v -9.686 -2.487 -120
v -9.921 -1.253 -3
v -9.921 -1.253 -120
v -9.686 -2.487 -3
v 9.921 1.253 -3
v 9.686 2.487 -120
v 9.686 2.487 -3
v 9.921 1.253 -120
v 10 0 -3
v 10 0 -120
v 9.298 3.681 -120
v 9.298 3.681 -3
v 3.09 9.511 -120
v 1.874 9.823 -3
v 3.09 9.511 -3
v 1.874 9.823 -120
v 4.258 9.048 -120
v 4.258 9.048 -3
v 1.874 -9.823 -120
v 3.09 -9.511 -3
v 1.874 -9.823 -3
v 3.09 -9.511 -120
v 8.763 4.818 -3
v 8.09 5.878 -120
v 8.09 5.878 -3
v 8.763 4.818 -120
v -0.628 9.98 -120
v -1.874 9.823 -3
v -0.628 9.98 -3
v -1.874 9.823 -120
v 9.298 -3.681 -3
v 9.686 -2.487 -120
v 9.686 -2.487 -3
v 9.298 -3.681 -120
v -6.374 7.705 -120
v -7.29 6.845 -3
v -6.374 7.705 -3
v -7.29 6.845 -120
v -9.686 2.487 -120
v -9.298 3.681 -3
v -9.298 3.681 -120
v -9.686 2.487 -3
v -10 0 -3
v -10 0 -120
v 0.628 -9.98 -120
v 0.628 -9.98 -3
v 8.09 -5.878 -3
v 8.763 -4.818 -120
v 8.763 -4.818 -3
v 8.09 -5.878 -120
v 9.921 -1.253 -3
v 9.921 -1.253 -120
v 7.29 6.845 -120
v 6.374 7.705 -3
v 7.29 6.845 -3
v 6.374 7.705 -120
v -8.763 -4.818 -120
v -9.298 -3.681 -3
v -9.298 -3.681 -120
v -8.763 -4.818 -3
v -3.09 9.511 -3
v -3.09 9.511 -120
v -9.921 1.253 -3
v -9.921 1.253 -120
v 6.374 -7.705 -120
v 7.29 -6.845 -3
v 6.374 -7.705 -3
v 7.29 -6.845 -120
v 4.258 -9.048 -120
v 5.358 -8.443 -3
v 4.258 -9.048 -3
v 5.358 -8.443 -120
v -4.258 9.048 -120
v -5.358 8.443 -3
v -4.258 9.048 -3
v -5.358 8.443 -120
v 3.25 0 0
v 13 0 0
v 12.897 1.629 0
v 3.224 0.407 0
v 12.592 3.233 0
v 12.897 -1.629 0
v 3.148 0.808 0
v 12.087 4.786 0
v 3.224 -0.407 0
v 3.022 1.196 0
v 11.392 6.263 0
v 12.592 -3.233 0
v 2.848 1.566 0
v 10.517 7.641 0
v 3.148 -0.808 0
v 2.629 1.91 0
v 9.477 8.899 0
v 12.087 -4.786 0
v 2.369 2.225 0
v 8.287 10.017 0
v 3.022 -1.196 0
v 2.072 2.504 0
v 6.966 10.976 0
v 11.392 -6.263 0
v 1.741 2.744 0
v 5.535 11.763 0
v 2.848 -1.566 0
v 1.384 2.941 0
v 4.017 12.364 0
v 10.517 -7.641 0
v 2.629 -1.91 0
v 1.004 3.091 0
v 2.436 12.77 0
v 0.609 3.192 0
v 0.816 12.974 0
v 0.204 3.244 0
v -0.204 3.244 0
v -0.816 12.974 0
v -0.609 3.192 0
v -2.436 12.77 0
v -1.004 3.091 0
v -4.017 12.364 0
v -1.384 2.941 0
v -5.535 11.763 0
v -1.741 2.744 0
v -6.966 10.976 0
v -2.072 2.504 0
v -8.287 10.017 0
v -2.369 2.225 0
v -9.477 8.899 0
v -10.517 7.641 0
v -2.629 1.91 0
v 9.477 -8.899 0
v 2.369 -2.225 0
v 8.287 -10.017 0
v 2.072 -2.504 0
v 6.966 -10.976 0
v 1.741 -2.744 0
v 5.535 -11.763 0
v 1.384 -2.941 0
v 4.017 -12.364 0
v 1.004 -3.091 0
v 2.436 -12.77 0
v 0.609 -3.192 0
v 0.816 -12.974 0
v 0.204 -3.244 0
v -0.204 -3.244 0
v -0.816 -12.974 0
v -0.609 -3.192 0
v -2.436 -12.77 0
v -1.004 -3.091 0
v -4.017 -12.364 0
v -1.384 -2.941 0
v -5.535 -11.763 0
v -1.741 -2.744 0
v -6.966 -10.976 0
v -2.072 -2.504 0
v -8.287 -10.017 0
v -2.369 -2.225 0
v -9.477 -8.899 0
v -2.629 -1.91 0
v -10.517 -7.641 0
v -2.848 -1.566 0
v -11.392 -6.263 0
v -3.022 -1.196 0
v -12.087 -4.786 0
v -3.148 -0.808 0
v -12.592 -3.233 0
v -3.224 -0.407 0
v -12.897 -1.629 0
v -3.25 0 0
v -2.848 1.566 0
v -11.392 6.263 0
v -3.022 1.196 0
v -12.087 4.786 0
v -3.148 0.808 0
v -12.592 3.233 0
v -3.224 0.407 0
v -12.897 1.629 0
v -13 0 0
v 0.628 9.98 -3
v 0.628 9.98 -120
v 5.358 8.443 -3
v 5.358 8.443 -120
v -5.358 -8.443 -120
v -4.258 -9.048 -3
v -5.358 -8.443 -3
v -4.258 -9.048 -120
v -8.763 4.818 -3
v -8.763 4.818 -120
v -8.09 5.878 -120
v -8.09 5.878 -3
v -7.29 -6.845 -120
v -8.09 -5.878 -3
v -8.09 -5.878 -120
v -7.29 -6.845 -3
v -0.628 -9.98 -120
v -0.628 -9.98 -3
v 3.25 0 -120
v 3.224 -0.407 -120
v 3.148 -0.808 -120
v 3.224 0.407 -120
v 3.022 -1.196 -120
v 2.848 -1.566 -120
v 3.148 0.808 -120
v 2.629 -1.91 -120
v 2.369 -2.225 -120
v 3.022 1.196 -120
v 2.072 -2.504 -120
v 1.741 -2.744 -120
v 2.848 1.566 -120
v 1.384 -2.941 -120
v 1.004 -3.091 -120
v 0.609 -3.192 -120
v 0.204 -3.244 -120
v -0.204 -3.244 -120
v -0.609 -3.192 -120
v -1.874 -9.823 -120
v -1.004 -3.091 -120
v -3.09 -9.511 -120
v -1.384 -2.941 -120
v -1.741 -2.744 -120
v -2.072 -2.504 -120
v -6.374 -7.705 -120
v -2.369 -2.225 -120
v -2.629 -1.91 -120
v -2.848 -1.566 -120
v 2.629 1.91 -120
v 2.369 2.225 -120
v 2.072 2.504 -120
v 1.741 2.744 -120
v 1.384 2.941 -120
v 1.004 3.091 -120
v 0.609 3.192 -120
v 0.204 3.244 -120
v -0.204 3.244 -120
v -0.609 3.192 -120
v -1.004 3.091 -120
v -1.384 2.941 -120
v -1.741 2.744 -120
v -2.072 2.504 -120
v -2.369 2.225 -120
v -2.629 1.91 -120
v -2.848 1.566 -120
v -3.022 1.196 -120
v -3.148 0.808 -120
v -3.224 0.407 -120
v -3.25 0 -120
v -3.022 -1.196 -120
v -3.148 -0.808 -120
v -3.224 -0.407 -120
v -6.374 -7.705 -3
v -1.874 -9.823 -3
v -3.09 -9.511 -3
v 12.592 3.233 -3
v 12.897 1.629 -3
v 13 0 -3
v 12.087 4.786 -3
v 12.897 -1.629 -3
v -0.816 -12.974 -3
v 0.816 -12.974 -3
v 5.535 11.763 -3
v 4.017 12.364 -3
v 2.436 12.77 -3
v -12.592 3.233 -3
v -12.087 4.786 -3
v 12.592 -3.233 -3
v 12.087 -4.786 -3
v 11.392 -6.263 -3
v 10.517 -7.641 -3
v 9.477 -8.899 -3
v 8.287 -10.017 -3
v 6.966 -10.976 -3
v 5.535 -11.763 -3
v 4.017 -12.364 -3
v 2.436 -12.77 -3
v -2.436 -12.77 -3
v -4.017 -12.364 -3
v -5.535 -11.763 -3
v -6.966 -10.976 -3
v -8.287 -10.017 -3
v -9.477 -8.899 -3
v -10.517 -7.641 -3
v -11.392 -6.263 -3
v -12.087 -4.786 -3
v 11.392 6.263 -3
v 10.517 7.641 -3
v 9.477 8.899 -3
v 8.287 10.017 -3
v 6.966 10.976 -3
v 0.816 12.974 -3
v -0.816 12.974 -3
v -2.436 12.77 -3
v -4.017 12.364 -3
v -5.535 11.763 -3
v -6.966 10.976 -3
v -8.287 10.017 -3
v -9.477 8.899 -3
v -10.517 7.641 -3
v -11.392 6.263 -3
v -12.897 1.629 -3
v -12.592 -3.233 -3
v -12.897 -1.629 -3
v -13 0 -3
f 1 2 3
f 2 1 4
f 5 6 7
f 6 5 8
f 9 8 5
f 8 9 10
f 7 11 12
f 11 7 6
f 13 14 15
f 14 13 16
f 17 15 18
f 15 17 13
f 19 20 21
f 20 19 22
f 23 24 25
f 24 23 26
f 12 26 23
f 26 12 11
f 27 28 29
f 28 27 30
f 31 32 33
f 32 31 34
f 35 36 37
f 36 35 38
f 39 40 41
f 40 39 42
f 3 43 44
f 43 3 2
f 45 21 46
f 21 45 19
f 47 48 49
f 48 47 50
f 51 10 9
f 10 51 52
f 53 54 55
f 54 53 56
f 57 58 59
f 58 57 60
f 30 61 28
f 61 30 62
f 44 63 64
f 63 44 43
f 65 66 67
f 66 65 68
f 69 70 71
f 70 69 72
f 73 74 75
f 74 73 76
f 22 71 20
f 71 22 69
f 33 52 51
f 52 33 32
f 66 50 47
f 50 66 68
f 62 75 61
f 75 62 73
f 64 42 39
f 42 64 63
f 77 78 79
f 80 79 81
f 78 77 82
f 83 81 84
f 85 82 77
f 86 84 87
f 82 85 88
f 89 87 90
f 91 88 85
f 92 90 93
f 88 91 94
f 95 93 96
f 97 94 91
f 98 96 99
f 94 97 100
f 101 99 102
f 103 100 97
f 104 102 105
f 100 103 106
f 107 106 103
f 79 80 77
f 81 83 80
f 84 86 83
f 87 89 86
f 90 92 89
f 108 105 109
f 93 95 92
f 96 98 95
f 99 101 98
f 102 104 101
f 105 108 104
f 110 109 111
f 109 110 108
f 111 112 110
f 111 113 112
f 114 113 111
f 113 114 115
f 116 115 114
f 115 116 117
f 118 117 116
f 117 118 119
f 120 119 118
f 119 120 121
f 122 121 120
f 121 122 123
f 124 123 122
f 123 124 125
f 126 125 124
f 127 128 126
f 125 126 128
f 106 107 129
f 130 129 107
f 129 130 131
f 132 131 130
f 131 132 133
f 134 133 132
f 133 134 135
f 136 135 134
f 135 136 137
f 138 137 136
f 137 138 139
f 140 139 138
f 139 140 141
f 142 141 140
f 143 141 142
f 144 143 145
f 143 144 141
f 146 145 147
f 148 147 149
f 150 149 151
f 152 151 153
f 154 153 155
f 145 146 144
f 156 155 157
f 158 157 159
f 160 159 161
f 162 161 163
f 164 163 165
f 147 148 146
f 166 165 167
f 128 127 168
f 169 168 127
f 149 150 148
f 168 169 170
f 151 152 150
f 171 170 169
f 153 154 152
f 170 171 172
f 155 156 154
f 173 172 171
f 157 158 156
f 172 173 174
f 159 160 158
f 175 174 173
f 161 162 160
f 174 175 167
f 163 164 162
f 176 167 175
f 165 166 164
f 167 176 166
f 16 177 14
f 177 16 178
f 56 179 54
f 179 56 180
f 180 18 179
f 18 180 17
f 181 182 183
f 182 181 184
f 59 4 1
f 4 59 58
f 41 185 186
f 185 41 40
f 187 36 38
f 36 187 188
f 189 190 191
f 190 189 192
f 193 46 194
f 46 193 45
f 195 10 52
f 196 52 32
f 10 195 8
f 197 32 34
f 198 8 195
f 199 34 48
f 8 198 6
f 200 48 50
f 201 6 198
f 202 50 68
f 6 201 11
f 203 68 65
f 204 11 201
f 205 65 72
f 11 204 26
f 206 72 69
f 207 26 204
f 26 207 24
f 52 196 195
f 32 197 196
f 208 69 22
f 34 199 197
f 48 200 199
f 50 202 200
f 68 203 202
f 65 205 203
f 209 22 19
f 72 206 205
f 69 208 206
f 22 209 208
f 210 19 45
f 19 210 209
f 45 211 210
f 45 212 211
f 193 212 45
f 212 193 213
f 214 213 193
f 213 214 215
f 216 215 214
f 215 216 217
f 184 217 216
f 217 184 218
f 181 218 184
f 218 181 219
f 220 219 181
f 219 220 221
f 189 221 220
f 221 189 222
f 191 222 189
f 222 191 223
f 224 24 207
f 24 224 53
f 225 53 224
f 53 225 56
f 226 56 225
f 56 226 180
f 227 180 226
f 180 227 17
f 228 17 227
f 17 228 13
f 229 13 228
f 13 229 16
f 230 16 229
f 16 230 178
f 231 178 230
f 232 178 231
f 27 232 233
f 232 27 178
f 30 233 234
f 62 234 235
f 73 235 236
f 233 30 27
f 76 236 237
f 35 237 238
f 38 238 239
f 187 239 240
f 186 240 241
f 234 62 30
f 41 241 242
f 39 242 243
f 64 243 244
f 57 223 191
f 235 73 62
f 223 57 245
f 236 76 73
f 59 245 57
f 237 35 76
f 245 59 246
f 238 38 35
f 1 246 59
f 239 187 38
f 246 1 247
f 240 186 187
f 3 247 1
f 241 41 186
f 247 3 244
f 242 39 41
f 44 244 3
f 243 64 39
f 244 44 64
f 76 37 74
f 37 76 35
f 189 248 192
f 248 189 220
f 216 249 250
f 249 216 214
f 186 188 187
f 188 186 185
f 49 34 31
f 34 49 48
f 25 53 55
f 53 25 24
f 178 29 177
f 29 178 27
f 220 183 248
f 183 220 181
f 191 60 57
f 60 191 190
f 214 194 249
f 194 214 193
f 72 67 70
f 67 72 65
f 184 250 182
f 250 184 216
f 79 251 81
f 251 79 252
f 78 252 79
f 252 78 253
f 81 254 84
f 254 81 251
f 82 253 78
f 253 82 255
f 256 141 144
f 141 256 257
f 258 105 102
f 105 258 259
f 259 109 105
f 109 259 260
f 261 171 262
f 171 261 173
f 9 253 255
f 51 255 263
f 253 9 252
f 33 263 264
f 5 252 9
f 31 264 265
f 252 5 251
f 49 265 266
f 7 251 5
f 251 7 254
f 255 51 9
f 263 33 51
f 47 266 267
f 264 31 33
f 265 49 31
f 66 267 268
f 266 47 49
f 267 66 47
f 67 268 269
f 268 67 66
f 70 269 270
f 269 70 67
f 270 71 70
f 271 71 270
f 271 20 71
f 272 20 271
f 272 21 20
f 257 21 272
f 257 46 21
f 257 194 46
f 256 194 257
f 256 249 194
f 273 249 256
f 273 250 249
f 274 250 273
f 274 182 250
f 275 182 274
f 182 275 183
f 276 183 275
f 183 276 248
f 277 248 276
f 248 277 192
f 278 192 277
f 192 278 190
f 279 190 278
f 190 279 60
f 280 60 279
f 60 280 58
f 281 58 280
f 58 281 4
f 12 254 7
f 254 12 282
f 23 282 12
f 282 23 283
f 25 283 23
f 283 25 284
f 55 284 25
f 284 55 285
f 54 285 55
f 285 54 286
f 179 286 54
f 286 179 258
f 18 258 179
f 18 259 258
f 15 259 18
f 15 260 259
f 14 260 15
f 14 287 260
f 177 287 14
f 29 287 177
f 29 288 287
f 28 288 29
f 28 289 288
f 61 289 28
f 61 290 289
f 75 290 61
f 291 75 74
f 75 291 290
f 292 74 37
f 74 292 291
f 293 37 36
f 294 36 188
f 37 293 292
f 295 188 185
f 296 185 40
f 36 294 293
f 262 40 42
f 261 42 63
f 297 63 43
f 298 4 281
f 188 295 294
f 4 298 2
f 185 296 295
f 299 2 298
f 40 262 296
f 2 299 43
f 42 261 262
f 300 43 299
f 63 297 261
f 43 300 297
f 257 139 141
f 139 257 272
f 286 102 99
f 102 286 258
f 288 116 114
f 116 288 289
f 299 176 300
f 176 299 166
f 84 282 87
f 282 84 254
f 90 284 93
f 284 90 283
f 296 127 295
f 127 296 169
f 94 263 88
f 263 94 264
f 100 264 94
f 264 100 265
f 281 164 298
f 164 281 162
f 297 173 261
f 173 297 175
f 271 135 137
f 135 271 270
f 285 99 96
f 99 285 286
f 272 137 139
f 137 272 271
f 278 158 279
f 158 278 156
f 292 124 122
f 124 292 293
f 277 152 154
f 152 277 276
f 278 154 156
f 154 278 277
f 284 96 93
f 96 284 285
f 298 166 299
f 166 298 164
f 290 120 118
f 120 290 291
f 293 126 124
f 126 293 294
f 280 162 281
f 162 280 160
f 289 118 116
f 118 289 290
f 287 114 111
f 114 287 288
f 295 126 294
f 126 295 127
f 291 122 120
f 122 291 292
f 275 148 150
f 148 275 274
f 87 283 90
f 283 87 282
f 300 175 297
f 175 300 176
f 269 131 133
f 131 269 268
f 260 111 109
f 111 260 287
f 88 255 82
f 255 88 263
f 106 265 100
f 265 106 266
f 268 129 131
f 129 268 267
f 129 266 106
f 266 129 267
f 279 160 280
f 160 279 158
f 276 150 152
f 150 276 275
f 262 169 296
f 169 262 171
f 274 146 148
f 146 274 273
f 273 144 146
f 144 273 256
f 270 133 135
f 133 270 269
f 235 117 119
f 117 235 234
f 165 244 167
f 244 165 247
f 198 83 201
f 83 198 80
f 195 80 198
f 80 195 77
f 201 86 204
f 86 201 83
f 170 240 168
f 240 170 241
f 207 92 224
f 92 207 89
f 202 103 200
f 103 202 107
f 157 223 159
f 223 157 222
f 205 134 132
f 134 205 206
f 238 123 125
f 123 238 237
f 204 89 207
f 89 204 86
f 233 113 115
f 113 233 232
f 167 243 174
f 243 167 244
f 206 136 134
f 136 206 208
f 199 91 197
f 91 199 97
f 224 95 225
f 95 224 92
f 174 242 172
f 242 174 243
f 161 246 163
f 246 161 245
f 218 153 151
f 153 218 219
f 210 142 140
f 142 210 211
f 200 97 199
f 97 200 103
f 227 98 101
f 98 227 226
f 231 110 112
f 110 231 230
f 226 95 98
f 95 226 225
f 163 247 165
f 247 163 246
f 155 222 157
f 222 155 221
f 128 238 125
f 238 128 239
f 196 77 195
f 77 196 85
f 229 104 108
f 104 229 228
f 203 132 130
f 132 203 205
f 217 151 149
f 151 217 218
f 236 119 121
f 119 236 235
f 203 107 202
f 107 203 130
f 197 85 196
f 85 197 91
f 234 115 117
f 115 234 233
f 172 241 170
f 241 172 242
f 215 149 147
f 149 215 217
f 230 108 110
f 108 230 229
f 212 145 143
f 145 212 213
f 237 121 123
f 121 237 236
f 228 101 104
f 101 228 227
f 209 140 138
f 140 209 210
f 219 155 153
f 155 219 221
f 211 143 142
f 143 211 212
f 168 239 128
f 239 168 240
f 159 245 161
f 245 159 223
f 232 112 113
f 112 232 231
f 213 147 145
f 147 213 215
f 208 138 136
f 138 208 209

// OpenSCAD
$fn = 50;


difference() {
	union() {
		translate(v = [0, 0, -120.0000000000]) {
			cylinder(h = 120, r = 10.0000000000);
		}
		translate(v = [0, 0, -3.0000000000]) {
			cylinder(h = 3, r = 13.0000000000);
		}
	}
	union() {
		#translate(v = [0, 0, -120]) {
			cylinder(h = 120, r = 3.2500000000);
		}
	}
}
